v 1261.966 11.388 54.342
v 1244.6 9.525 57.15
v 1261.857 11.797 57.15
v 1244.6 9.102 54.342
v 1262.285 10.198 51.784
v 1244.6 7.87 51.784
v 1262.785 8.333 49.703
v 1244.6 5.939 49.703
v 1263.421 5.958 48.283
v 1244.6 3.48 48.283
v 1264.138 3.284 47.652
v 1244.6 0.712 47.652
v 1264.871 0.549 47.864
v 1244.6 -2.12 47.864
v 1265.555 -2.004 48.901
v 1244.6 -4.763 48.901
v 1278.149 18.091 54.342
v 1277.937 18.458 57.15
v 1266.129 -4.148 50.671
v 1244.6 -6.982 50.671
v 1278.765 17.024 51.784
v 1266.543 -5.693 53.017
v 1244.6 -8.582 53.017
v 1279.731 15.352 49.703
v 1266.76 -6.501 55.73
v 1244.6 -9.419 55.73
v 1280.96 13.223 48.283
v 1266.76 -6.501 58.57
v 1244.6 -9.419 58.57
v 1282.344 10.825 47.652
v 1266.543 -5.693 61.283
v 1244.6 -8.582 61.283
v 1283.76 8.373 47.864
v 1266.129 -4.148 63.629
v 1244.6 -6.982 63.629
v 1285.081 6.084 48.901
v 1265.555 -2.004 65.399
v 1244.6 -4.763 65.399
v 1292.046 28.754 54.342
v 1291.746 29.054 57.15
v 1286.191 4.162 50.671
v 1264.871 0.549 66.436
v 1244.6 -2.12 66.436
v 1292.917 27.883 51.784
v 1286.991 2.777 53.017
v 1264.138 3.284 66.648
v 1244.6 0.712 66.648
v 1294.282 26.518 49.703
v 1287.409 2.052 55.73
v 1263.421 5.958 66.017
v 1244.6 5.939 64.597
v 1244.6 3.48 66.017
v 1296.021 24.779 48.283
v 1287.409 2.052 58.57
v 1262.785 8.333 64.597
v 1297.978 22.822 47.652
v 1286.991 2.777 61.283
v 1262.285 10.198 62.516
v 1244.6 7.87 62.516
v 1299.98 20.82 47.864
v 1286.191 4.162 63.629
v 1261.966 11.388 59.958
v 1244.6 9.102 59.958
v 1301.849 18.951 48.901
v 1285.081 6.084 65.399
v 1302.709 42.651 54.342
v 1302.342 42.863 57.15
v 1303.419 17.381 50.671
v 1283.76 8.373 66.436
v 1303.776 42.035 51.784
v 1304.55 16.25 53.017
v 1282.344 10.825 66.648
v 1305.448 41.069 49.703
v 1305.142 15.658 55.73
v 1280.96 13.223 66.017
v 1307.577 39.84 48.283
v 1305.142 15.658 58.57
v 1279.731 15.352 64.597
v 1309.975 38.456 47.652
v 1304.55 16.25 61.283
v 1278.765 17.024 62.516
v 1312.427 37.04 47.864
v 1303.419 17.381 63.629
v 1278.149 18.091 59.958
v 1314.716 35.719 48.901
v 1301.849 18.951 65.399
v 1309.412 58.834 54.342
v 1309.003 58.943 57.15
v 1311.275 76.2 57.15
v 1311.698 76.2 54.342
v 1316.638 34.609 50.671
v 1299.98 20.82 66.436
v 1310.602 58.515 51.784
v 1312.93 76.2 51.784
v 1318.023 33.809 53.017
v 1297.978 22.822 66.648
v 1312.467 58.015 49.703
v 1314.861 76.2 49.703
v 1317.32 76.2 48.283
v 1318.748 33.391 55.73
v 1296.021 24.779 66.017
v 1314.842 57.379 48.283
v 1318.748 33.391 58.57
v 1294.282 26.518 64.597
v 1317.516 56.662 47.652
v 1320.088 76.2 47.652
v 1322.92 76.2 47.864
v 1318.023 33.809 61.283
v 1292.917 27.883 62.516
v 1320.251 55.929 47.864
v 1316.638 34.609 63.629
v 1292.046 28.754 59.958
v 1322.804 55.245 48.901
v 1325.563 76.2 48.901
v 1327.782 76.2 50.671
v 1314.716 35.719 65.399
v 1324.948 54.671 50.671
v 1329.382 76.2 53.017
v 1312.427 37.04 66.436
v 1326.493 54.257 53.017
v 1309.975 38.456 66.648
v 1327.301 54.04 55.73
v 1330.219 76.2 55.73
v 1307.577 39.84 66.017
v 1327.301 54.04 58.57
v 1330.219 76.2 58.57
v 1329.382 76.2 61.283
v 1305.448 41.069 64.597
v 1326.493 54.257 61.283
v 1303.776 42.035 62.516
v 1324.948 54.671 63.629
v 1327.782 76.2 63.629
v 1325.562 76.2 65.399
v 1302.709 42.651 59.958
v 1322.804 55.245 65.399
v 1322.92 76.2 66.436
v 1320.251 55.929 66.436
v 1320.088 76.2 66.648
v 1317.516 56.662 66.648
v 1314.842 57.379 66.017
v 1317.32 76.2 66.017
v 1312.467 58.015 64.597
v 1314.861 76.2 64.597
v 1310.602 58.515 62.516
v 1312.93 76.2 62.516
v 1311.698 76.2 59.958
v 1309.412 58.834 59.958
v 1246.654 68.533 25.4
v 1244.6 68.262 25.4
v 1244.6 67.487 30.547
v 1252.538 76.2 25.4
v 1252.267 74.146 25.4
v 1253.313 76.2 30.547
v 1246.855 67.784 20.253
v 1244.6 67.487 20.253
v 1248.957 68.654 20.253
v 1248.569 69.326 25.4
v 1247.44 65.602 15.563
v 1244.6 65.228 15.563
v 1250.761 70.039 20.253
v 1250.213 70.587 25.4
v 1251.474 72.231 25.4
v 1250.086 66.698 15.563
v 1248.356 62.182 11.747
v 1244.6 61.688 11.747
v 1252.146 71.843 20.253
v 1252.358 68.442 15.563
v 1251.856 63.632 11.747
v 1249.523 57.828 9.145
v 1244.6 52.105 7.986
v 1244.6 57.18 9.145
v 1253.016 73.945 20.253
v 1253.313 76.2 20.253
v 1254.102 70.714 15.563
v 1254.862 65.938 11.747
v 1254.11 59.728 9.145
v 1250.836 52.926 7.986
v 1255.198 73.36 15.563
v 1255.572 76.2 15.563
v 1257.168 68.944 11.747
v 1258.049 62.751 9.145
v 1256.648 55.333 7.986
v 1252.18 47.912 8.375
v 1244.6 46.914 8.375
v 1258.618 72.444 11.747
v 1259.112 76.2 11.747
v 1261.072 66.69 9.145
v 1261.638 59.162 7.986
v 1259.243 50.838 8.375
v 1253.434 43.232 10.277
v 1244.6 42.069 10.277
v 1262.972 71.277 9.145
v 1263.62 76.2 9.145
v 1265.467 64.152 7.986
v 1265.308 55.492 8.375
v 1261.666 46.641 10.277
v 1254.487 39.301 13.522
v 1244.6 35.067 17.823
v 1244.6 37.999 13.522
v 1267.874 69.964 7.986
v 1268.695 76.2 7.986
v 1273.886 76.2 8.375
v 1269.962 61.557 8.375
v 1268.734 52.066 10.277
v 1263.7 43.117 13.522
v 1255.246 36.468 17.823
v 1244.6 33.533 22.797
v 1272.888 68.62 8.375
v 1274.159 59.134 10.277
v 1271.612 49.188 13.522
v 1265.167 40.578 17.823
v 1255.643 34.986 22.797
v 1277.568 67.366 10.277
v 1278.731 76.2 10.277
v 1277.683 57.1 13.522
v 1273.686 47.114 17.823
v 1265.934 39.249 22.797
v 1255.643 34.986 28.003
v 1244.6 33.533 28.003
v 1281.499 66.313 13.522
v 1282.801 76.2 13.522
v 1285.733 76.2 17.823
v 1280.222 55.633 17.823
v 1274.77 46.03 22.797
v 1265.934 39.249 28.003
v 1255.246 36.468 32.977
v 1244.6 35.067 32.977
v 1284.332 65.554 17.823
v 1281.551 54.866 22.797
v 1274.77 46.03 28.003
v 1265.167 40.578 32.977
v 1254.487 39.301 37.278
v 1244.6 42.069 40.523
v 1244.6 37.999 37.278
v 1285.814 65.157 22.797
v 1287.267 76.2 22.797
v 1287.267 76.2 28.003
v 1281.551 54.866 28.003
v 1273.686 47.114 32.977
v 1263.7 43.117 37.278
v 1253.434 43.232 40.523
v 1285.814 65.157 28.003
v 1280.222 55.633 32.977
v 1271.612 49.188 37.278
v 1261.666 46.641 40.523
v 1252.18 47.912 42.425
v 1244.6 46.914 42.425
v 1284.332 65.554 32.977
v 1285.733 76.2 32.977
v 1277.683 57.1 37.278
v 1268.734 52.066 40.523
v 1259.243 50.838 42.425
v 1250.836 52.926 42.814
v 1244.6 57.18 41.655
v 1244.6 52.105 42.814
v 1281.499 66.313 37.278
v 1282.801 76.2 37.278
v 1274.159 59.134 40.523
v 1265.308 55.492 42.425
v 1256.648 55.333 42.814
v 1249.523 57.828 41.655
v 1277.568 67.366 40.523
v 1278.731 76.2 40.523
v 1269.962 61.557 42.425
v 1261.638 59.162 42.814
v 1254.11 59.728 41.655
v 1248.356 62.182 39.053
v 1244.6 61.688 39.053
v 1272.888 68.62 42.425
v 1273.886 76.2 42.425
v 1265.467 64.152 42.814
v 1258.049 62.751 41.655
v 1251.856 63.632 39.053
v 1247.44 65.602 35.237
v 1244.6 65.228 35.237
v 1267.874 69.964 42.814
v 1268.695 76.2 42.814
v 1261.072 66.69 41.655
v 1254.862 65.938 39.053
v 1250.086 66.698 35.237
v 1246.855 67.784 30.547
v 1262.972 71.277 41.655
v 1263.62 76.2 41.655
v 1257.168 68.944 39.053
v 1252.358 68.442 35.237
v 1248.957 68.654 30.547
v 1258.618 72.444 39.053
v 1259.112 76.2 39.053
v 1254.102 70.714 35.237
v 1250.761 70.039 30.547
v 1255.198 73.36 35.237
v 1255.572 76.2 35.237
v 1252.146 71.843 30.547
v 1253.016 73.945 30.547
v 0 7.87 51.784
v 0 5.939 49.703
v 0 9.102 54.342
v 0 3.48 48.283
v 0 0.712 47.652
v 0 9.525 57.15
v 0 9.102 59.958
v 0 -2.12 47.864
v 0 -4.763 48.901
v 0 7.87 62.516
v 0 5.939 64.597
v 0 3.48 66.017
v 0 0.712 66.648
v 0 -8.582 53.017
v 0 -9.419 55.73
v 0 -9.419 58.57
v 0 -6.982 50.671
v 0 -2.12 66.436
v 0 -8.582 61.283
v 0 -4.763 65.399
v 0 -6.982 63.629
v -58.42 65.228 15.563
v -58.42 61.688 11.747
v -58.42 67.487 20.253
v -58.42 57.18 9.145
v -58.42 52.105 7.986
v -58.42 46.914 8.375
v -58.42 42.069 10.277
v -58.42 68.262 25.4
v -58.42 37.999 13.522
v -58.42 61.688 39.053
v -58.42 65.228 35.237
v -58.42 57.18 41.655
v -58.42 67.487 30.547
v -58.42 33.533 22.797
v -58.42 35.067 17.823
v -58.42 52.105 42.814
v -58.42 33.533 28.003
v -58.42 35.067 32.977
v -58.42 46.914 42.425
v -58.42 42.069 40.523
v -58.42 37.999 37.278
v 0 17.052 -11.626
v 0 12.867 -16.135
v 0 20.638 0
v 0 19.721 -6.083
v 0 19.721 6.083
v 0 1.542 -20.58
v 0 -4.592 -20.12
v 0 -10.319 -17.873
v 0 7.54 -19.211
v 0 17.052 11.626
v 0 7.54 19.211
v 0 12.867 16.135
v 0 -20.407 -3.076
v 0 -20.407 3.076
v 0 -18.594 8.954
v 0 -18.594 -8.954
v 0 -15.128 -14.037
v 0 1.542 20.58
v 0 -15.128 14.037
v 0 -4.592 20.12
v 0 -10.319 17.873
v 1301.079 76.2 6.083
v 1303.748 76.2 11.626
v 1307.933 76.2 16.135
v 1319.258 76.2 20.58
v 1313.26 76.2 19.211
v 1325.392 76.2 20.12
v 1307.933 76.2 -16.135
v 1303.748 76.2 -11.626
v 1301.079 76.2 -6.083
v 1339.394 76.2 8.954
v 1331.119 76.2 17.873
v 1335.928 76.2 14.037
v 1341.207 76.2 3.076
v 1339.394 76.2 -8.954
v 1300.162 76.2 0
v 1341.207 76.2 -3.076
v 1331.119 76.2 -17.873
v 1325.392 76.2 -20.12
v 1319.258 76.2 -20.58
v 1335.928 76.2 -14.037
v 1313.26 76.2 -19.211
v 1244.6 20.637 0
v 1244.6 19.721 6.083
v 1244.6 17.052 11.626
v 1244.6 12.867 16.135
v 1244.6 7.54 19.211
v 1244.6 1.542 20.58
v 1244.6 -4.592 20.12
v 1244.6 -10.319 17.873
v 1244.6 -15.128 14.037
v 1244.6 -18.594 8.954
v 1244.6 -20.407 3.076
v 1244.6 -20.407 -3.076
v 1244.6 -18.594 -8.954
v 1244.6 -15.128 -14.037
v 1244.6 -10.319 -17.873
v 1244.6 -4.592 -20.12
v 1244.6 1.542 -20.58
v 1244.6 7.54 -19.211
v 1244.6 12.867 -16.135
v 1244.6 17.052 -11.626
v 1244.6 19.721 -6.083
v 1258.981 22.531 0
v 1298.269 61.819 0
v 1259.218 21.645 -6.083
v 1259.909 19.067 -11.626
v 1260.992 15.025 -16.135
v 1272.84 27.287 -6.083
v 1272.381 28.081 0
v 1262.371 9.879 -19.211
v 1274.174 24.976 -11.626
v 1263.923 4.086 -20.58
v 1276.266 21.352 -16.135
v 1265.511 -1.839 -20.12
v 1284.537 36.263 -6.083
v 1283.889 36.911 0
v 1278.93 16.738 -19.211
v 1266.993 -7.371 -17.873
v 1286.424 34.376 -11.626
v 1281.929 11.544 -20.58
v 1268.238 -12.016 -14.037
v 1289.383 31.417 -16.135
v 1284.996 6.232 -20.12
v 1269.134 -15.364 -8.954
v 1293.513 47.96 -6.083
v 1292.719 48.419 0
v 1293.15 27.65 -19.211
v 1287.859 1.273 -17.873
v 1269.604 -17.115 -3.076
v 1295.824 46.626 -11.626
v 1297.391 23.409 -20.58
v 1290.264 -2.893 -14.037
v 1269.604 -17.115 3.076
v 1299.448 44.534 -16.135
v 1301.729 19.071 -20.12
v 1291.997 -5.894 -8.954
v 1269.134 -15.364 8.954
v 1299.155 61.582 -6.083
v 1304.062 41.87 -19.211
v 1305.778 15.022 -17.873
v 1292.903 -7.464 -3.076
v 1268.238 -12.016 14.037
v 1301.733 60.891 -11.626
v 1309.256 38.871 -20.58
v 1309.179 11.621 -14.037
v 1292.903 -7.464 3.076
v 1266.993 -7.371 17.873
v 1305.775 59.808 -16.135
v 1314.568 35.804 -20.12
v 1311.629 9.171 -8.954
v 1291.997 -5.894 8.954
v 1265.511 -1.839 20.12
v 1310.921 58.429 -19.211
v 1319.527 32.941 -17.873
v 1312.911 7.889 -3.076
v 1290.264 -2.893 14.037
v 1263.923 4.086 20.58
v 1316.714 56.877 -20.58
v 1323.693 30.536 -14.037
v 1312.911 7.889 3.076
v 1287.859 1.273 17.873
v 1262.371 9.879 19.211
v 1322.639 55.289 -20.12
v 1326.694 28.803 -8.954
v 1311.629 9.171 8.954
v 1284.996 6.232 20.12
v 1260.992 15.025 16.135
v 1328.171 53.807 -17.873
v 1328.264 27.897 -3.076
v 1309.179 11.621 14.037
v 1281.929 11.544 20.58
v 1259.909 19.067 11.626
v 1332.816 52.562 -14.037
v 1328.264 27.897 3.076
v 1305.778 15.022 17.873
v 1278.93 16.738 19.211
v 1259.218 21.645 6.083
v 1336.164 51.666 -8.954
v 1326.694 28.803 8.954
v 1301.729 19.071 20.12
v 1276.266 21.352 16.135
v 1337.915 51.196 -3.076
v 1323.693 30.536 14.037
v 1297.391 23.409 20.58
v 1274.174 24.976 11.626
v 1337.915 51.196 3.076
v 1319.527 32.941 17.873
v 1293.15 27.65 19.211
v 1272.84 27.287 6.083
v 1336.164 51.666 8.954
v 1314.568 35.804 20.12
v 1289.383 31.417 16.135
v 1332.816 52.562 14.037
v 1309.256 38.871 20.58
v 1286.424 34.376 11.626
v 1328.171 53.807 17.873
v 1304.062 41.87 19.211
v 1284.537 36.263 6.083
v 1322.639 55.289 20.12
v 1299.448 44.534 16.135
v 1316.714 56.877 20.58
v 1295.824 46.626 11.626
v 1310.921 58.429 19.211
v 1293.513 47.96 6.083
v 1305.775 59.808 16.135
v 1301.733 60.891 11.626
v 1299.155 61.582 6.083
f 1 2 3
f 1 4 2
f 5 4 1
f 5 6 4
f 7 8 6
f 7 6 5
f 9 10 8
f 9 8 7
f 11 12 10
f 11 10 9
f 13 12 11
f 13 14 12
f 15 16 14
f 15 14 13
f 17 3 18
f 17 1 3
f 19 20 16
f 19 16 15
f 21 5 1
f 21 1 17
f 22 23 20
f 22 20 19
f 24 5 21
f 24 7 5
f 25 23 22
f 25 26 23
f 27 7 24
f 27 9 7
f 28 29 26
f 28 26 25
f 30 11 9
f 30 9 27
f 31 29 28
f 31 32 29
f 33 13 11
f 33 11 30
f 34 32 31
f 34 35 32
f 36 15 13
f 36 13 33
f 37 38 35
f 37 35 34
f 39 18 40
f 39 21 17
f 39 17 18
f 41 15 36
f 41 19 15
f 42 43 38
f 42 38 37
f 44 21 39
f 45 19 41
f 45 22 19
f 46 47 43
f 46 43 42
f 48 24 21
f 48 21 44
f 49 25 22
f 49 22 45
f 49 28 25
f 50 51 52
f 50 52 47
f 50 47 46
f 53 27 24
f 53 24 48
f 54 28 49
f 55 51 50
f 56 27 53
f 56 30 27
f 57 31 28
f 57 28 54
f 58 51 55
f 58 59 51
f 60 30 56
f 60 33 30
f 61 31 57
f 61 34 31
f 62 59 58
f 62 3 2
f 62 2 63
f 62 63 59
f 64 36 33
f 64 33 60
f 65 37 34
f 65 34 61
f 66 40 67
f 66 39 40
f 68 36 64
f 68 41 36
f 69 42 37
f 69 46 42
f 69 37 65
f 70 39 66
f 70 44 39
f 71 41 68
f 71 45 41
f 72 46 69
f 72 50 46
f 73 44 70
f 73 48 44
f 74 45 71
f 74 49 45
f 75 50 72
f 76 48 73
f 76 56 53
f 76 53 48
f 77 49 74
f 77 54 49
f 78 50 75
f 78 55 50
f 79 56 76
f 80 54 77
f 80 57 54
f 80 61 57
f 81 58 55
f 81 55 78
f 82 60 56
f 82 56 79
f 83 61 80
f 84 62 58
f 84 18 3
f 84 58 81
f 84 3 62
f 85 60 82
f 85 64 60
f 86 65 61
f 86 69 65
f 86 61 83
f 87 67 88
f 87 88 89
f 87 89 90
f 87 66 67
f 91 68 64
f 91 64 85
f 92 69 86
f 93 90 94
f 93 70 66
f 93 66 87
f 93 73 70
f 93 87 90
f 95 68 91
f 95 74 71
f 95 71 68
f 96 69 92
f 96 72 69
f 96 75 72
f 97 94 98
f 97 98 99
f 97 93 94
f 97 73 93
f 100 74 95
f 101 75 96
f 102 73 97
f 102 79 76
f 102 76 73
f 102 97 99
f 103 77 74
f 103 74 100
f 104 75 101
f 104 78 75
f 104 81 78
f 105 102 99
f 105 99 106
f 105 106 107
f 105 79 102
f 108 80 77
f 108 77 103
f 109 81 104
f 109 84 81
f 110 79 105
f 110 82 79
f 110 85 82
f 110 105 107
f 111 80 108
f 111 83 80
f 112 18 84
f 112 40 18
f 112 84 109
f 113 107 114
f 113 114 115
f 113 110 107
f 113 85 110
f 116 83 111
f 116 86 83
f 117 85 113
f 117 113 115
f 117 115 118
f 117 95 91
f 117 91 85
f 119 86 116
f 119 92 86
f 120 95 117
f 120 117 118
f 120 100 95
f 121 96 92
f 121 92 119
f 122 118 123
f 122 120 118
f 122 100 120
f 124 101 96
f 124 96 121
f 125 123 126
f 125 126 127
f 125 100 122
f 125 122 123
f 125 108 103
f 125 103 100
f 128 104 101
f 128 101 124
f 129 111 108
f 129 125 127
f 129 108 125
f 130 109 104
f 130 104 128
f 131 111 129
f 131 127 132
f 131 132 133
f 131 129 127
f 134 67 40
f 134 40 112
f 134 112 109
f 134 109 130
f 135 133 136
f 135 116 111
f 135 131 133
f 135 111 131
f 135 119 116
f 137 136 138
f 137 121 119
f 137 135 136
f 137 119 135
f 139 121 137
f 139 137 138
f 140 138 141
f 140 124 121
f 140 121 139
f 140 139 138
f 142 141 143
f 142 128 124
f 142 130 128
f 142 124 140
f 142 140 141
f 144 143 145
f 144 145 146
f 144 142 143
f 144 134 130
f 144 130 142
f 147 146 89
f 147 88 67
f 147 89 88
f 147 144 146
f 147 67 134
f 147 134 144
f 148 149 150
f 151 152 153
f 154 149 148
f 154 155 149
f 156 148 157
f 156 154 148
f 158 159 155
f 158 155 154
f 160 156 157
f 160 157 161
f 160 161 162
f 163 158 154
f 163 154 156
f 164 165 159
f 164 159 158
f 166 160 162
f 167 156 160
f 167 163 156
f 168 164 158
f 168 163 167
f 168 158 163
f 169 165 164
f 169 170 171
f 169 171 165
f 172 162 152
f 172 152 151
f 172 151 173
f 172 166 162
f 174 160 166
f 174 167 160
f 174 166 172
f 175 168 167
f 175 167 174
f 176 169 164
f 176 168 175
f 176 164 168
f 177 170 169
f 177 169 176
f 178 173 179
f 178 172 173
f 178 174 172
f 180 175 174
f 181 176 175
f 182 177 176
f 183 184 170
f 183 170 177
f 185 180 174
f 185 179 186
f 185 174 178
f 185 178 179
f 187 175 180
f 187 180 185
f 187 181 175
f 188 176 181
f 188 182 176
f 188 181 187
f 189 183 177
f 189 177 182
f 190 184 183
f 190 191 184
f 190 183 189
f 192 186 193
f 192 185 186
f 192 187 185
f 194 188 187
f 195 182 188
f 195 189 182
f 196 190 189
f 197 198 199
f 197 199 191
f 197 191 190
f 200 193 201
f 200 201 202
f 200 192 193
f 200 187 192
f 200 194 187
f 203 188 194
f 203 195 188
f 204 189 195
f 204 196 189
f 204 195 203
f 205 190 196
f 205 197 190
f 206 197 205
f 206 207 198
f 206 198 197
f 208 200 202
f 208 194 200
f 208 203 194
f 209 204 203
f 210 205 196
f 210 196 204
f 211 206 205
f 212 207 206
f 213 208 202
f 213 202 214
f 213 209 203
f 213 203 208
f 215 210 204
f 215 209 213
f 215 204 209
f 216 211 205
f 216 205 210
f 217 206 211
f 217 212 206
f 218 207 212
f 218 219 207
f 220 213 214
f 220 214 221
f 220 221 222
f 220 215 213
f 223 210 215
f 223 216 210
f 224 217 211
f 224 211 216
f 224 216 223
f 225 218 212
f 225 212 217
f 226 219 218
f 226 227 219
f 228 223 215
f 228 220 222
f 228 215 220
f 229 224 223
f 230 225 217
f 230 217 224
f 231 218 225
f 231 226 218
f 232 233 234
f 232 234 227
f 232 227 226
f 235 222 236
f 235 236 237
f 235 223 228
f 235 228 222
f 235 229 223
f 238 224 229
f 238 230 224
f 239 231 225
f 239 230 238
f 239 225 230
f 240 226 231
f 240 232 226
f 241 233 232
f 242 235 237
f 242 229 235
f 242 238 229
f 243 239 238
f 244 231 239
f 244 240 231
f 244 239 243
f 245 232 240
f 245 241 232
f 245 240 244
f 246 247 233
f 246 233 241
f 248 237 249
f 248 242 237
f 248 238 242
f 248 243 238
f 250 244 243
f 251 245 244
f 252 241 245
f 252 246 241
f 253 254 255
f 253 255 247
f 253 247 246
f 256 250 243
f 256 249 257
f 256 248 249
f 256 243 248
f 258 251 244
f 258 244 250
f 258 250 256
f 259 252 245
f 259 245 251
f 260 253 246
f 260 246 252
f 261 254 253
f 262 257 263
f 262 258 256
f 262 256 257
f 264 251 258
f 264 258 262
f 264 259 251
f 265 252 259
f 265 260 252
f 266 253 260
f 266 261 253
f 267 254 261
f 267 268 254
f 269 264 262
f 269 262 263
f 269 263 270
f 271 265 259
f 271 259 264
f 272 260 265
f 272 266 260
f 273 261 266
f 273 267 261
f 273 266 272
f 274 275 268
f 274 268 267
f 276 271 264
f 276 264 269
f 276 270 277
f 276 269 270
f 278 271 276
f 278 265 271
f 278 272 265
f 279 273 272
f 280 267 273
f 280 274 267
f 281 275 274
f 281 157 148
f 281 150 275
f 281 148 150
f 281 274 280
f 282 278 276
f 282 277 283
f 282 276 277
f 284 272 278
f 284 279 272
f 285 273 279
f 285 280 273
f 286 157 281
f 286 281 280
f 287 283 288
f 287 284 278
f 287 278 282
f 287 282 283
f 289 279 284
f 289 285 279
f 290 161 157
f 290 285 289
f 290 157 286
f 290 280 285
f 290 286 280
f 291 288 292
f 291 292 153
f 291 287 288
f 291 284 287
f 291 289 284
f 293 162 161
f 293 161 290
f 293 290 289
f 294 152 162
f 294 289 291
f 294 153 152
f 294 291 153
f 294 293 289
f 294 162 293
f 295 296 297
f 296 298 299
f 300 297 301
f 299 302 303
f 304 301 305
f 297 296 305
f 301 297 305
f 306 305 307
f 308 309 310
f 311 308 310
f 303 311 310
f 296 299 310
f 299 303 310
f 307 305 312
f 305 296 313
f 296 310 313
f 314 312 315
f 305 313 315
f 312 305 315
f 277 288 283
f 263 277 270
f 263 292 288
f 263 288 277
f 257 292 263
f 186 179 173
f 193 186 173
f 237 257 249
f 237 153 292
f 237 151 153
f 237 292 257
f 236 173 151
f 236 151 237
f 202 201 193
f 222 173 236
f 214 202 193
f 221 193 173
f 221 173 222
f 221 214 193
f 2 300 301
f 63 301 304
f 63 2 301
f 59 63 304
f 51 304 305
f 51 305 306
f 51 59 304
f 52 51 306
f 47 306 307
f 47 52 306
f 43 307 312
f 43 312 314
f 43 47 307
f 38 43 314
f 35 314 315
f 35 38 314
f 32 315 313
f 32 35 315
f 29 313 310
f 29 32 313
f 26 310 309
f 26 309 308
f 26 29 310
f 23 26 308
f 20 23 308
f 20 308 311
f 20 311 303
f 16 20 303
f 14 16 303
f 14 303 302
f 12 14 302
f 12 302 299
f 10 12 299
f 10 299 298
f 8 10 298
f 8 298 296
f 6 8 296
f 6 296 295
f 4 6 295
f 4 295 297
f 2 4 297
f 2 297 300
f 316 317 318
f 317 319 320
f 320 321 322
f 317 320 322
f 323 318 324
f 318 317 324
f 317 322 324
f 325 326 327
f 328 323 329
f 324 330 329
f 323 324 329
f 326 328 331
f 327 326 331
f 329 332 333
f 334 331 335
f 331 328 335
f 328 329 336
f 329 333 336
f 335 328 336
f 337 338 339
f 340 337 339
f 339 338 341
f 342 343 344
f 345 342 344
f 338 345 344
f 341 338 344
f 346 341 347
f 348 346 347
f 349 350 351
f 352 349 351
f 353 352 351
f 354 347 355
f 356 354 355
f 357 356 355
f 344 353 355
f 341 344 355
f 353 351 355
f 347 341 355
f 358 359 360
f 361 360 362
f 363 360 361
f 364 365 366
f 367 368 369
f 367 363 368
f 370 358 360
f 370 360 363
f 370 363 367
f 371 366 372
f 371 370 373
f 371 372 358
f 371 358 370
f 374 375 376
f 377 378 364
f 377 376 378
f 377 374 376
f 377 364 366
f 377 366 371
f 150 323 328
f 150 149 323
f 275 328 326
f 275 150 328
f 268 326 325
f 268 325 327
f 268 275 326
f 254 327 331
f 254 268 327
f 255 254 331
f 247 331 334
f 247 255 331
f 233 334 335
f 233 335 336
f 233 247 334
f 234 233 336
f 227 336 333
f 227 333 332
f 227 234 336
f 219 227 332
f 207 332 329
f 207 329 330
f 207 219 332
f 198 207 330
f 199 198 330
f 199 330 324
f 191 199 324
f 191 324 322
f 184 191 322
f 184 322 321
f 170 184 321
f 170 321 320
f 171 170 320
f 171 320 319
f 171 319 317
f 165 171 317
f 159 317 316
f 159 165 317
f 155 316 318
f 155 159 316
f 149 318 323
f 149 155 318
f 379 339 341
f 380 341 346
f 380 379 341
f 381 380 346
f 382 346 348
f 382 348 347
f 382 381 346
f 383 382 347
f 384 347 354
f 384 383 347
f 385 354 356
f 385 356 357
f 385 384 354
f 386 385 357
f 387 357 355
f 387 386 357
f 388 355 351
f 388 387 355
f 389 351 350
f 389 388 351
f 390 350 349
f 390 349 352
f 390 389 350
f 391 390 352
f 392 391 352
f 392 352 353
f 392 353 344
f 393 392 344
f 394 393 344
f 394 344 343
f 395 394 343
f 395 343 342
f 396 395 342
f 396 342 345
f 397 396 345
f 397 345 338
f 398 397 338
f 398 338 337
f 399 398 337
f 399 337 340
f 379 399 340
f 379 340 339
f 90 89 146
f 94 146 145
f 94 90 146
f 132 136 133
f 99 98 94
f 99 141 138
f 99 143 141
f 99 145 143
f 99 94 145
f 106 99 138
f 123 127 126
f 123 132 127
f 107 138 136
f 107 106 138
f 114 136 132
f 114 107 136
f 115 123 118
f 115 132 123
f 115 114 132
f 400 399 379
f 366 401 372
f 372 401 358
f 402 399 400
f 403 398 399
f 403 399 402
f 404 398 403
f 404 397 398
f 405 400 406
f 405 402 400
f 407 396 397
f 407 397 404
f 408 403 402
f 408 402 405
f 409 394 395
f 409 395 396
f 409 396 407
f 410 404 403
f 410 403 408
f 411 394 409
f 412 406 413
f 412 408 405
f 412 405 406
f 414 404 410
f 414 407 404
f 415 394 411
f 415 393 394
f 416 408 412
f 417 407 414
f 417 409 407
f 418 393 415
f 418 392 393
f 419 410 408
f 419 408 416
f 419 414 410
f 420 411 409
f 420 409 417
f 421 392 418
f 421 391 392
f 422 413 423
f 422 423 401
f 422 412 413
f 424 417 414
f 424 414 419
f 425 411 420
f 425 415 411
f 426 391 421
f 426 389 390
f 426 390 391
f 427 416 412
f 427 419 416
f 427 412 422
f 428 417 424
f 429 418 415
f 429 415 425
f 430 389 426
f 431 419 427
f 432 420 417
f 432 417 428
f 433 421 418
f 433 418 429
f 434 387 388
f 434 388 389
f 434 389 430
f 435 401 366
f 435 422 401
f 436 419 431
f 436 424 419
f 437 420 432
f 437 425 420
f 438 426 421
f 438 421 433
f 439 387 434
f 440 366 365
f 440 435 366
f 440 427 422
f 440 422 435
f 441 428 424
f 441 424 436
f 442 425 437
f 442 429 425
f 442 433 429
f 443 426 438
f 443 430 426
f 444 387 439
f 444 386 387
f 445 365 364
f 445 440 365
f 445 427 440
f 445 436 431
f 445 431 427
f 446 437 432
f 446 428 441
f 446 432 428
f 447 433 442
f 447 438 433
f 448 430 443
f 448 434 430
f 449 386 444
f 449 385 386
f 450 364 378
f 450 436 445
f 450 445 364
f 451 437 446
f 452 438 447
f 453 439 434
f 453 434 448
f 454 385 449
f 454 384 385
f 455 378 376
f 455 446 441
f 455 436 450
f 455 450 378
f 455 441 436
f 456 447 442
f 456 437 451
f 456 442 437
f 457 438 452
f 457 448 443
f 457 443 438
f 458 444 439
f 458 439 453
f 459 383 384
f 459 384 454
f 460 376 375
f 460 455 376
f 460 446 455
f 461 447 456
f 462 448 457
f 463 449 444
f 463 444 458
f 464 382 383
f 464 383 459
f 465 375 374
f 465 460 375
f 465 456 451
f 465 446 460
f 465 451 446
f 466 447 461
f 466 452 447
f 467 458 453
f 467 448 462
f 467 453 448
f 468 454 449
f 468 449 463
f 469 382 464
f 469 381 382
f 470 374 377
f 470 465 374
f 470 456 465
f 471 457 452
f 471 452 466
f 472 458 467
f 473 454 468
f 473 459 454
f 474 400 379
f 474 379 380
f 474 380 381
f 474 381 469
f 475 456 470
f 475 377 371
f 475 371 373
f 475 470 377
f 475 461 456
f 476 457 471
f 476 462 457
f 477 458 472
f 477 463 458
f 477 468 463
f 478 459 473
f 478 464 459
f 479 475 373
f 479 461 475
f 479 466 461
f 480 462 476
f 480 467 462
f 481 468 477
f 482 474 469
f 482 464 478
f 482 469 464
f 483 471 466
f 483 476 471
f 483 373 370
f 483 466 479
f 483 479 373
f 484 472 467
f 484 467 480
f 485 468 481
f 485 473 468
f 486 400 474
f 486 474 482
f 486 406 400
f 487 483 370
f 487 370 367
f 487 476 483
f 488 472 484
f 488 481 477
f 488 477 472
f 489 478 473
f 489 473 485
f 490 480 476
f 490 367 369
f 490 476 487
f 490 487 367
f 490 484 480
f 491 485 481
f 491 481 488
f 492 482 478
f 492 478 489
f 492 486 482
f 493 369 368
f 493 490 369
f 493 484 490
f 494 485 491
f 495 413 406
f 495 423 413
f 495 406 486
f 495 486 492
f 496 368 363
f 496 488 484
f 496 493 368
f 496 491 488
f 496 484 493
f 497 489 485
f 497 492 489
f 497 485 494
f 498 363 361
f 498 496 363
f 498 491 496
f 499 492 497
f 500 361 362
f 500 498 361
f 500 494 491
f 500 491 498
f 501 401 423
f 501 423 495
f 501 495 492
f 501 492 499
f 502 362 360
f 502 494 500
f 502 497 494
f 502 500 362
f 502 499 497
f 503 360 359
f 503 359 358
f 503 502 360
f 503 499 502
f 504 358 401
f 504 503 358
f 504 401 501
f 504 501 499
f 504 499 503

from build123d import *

# Parameters (mm, degrees)
F0_R     = 20.6375
F0_R_2   = 9.525
F0_R_3   = 17.4625
F3_DEPTH = 58.42


with BuildPart() as f2:
    # F2: sweep along a path in F1
    with BuildLine(Plane.XY) as f2_path:
        Line((0, 0), (1244.6, 0))
        ThreePointArc((1244.6, 0), (1298.4815367264, 22.3184632736), (1320.8, 76.2))
    # F0 (on Right) → F2 (sweep)
    with BuildSketch(Plane.YZ):
        Circle(F0_R)
        with Locations((0, 57.15)):
            Circle(F0_R_2)
        with Locations((50.8, 25.4)):
            Circle(F0_R_3)
    sweep(path=f2_path.line)

    # F3 (add): a face of the model
    f3_faces = [f2.faces().sort_by_distance(p)[0] for p in [
        (0, 50.8, 25.4),
    ]]
    extrude(f3_faces, amount=F3_DEPTH)


solid = f2.part
